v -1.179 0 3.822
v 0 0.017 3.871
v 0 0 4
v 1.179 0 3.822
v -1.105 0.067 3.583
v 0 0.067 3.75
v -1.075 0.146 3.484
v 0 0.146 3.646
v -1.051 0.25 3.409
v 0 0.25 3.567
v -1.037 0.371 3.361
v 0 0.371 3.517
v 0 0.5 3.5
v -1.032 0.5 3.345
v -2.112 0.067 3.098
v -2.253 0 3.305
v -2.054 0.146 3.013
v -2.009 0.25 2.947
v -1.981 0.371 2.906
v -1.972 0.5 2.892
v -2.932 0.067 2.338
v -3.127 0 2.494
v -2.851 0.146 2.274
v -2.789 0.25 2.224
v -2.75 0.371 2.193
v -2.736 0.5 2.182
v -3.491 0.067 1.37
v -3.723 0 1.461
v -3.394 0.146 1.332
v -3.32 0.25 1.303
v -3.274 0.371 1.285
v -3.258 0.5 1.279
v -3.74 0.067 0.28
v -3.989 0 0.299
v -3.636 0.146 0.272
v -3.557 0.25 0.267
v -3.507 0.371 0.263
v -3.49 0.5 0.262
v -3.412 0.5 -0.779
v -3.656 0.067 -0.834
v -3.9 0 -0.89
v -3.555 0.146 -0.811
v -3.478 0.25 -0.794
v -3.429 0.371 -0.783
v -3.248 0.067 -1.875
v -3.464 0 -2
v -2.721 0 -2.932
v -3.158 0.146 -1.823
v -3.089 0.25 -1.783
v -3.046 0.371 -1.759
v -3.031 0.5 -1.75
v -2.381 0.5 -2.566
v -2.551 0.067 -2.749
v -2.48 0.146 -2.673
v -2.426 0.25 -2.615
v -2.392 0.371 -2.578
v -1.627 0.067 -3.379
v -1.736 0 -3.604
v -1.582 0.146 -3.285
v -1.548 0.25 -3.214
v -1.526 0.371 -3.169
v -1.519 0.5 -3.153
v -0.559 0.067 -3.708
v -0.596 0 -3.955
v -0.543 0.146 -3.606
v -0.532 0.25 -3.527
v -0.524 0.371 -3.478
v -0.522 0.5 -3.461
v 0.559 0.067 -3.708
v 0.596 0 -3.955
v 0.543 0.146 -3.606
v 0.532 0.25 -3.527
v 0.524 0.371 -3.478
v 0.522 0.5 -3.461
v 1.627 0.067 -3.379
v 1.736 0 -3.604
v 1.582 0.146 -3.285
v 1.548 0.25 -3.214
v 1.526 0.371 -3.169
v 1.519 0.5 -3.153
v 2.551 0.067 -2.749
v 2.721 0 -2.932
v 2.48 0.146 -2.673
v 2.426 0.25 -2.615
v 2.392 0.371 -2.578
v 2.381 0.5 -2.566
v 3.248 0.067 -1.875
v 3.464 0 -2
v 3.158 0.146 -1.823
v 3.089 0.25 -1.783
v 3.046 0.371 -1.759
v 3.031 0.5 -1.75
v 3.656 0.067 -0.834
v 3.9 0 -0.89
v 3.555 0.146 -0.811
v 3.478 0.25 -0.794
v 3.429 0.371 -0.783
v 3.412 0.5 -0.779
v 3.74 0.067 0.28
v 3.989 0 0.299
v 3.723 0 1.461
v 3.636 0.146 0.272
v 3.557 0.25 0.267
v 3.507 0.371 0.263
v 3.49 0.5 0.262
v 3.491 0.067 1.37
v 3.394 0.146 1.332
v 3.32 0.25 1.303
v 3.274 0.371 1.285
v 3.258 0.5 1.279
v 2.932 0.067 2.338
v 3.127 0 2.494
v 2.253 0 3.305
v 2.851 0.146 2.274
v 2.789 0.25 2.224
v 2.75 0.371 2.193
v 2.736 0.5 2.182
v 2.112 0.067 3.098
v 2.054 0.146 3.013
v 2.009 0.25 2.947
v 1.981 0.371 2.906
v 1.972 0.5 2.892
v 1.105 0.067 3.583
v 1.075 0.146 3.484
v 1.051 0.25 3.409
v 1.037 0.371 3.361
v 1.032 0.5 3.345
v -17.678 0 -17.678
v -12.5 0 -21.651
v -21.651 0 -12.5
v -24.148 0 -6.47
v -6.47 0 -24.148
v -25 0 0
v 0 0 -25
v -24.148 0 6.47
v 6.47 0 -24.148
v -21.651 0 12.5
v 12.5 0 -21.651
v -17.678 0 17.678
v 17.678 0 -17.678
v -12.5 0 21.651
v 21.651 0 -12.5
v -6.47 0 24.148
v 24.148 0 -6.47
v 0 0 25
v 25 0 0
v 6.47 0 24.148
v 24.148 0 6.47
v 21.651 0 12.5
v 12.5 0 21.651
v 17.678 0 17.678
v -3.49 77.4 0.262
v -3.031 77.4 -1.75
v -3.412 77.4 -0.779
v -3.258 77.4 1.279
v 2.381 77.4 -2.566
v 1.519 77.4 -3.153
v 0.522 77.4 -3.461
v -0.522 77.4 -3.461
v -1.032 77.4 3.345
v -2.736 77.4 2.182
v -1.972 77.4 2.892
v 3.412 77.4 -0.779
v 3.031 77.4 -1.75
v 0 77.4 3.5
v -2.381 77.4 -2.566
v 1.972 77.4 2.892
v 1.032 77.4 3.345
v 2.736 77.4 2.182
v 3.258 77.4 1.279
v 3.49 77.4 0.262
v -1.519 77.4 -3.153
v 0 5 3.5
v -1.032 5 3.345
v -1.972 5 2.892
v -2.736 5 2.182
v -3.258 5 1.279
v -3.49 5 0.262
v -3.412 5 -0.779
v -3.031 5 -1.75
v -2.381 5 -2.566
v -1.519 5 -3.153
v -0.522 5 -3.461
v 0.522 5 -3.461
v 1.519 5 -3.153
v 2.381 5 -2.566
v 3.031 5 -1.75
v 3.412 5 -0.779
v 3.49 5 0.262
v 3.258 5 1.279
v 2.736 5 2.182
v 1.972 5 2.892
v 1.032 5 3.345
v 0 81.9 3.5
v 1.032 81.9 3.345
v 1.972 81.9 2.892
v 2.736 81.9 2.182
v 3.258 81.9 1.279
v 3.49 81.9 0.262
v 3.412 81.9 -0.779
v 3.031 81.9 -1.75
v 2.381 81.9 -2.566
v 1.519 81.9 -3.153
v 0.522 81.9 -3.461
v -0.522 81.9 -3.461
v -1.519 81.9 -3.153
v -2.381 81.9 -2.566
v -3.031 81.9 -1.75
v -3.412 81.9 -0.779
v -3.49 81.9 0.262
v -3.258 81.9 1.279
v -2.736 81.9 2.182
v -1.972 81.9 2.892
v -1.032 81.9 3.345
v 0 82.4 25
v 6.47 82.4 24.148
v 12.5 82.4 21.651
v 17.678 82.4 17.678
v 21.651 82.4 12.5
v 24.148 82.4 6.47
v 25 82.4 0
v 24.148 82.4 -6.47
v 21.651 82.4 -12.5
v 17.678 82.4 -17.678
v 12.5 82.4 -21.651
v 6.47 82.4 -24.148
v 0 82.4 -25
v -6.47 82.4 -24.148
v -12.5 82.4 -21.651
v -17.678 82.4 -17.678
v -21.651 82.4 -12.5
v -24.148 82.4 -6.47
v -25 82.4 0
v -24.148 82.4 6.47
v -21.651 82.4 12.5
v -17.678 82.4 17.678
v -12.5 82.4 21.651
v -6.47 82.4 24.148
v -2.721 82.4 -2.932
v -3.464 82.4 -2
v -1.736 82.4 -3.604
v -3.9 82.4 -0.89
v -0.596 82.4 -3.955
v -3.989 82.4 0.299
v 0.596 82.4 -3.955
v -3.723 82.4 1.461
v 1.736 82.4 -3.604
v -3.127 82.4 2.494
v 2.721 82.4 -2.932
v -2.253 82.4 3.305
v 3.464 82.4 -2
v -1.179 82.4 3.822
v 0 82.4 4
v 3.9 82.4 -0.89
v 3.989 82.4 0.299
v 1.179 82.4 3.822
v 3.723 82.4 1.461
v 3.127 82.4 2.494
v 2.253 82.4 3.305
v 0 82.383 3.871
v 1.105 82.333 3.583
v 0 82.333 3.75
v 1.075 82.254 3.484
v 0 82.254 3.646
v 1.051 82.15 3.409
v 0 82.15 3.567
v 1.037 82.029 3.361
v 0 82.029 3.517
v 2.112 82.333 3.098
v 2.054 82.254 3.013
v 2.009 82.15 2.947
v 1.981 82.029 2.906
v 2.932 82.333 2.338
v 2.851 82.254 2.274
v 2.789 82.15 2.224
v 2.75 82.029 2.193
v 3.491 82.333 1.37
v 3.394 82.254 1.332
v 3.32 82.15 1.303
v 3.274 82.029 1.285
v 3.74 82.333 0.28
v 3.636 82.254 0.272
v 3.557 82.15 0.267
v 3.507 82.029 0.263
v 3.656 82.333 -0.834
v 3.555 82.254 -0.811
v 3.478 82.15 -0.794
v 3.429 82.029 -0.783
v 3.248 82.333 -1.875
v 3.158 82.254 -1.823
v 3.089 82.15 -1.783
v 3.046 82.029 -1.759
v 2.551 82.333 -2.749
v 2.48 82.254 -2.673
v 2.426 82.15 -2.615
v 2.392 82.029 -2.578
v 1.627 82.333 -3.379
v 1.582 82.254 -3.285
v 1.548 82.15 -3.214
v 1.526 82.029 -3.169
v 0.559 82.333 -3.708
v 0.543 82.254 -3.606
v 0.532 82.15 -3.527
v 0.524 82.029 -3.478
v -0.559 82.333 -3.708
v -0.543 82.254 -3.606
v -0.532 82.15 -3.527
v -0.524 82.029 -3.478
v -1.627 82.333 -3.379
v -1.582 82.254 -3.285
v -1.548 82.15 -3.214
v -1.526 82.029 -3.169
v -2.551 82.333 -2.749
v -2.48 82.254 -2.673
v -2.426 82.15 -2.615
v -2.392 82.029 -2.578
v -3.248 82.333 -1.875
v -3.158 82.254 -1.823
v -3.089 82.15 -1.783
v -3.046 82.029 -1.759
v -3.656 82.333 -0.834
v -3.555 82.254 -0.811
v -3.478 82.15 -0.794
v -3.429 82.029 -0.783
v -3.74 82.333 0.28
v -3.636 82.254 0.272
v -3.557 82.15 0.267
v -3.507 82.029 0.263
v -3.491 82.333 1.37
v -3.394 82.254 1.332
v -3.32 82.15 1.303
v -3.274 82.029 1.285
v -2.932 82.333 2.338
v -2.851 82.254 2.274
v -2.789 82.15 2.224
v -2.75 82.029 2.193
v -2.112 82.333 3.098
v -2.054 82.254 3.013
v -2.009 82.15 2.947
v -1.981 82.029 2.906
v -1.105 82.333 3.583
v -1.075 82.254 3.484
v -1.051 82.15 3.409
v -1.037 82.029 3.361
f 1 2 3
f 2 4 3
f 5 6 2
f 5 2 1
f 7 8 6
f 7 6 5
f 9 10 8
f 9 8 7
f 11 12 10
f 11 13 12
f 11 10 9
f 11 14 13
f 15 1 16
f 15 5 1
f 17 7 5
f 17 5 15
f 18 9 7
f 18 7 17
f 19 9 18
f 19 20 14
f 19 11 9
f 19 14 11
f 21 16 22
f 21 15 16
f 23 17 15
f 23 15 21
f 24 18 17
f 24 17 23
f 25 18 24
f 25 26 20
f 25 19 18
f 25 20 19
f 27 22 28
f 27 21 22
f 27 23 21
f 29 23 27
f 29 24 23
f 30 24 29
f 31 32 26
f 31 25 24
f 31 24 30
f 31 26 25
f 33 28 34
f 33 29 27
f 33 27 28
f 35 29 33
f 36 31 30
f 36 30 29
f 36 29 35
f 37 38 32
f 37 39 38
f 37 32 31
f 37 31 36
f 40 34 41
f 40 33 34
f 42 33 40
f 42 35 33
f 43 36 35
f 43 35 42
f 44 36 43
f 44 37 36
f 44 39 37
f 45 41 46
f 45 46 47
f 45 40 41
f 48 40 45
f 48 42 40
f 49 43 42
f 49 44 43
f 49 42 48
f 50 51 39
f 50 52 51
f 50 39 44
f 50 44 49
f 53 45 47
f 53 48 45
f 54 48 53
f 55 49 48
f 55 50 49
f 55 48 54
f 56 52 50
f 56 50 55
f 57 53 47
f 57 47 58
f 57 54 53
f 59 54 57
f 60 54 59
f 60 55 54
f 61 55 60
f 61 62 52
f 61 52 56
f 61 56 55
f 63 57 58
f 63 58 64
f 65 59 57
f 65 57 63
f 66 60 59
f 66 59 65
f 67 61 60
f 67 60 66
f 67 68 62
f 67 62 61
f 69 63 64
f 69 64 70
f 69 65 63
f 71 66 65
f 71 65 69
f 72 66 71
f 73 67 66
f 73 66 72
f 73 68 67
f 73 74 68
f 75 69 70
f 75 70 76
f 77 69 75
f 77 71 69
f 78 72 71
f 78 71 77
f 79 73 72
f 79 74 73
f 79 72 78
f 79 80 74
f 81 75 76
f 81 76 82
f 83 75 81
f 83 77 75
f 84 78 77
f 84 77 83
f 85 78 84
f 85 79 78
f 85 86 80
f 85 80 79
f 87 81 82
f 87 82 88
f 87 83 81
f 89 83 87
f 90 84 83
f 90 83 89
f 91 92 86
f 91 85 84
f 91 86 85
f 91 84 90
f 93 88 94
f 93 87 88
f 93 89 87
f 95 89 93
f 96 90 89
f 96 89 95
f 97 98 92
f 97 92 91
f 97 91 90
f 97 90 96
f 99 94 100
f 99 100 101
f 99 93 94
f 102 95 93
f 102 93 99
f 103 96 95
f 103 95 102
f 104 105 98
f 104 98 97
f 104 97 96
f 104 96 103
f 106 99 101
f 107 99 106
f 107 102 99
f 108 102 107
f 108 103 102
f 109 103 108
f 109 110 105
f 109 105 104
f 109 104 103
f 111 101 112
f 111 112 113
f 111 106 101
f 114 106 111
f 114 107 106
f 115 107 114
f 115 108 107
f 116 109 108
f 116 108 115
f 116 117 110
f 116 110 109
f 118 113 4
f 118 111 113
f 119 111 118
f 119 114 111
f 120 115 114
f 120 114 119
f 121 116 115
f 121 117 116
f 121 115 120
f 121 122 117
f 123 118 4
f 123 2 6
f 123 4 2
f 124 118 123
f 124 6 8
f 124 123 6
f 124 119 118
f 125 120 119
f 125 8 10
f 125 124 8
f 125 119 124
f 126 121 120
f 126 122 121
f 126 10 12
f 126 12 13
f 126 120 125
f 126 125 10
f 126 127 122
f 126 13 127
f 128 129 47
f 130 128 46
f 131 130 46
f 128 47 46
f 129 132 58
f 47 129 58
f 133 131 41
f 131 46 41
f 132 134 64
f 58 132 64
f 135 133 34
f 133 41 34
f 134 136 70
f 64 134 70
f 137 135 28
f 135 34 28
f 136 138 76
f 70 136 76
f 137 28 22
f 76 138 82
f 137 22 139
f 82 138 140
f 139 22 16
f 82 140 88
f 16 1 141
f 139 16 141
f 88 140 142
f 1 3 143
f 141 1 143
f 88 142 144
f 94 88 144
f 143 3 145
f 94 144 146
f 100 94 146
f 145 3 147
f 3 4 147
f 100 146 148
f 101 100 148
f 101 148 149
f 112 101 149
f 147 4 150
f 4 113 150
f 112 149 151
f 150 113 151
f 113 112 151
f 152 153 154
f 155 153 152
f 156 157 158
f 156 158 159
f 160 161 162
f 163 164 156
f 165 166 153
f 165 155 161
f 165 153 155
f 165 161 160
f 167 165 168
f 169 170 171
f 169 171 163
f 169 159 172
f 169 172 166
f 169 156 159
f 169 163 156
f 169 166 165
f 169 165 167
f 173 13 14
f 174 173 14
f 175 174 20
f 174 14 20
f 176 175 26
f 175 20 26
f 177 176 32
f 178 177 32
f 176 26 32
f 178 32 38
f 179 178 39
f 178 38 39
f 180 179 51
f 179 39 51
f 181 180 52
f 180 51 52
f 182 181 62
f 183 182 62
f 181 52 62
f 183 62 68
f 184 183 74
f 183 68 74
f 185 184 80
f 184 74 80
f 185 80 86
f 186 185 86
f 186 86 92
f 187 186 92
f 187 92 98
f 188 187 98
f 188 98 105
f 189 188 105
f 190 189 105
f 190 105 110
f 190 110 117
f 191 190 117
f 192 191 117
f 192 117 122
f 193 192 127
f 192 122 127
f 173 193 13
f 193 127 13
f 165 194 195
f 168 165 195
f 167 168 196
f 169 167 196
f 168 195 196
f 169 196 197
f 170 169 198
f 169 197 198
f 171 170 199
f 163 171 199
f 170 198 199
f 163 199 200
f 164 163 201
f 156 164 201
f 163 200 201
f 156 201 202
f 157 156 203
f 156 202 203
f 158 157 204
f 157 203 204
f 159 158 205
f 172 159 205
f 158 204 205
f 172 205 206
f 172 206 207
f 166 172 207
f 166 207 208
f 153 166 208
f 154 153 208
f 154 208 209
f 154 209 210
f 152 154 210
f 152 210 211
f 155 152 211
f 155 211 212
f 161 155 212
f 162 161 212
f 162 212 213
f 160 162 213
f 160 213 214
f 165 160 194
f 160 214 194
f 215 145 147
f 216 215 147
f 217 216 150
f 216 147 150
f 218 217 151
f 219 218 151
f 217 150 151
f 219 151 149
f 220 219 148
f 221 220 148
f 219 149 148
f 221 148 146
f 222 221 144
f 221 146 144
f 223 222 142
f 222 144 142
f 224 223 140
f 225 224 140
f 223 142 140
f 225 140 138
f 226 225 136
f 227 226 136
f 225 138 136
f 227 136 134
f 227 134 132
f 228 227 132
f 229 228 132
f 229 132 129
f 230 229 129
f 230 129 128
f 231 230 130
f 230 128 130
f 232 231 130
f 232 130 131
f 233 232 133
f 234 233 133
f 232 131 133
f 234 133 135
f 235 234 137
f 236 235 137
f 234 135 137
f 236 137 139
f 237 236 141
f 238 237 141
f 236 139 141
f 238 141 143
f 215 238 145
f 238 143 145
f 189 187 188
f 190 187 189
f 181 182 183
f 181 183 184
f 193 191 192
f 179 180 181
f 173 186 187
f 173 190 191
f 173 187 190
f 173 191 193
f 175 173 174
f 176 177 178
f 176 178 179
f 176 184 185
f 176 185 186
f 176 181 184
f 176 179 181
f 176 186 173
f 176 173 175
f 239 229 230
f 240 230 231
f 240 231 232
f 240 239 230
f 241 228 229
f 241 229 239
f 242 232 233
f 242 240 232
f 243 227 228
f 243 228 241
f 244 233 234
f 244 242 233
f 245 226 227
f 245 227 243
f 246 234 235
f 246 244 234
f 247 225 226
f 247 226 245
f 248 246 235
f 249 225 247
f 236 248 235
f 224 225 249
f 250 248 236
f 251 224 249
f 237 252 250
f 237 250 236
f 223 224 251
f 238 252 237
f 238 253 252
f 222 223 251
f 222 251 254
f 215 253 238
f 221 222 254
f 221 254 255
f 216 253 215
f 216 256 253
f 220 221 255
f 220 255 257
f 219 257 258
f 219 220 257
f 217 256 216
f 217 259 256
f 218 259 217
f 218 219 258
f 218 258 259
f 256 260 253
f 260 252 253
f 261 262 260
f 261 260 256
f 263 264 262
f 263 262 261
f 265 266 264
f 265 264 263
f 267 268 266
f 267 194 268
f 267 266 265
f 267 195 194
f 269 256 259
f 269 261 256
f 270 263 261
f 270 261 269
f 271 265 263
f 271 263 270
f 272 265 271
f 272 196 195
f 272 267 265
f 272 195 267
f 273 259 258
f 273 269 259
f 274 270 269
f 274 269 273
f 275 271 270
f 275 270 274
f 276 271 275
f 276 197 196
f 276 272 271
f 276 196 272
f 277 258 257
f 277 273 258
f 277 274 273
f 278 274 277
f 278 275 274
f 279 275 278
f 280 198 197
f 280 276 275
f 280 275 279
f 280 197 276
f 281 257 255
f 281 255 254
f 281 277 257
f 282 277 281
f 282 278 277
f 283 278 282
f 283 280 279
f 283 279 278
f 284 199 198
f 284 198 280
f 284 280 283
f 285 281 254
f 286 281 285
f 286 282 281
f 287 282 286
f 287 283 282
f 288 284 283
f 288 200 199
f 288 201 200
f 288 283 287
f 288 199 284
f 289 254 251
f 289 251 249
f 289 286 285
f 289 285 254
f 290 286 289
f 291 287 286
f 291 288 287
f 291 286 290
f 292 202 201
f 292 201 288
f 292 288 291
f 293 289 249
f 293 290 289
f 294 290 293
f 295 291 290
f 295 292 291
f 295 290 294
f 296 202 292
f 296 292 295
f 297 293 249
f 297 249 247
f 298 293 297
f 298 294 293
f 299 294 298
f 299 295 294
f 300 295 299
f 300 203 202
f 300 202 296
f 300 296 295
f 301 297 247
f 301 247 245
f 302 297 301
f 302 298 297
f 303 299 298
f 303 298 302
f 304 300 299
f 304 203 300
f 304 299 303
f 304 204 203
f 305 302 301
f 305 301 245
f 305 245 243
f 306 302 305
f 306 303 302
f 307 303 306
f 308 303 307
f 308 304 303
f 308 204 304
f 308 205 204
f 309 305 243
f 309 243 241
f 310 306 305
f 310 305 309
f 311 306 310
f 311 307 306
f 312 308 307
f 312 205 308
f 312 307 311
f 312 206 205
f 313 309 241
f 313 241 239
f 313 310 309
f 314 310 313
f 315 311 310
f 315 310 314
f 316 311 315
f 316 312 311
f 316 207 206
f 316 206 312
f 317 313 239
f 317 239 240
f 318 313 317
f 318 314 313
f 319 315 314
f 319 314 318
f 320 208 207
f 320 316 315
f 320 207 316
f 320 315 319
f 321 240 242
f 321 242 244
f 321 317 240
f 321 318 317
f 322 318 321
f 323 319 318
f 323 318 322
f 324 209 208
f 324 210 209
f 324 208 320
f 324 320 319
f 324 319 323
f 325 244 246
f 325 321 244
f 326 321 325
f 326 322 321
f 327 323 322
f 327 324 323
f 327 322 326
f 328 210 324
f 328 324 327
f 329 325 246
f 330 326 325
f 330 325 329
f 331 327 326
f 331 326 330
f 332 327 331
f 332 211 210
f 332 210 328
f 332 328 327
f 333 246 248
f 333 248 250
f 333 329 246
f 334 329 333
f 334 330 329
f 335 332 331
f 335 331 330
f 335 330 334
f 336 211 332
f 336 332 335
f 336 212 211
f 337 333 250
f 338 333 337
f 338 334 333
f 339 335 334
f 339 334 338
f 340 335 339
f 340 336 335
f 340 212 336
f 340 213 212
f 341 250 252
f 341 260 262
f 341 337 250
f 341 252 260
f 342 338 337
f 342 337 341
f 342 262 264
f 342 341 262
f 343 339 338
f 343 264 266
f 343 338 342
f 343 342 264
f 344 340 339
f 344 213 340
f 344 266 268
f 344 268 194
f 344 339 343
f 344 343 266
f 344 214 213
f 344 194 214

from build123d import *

# Parameters (mm, degrees)
SKETCH1_R           = 25
BOSS_EXTRUDE1_DEPTH = 82.4
SKETCH2_R           = 3.5
CUT_EXTRUDE1_DEPTH  = 5
SKETCH3_R           = 3.5
CUT_EXTRUDE2_DEPTH  = 5
FILLET1_R           = 0.5


with BuildPart() as part:
    # Sketch1 → Boss-Extrude1 (new body)
    with BuildSketch(Plane(origin=(0, 0, 0), x_dir=(1, 0, 0), z_dir=(0, 1, 0))):
        with Locations(Location((0, 0, 0), (0, 0, 270))):  # turned: the seam where the file's is
            Circle(SKETCH1_R)
    extrude(amount=BOSS_EXTRUDE1_DEPTH)

    # Sketch2 → Cut-Extrude1 (cut)
    with BuildSketch(Plane(origin=(0, 82.4, 0), x_dir=(1, 0, 0), z_dir=(0, 1, 0))):
        with Locations(Location((0, 0, 0), (0, 0, 270))):  # turned: the seam where the file's is
            Circle(SKETCH2_R)
    extrude(amount=-CUT_EXTRUDE1_DEPTH, mode=Mode.SUBTRACT)

    # Sketch3 → Cut-Extrude2 (cut)
    with BuildSketch(Plane.XZ):
        with Locations(Location((0, 0, 0), (0, 0, 90))):  # turned: the seam where the file's is
            Circle(SKETCH3_R)
    extrude(amount=-CUT_EXTRUDE2_DEPTH, mode=Mode.SUBTRACT)

    # Fillet1
    fillet1_edges = [part.edges().sort_by_distance(p)[0] for p in [
        (0, 0, -3.5),
        (0, 82.4, -3.5),
    ]]
    fillet(fillet1_edges, radius=FILLET1_R)


solid = part.part
